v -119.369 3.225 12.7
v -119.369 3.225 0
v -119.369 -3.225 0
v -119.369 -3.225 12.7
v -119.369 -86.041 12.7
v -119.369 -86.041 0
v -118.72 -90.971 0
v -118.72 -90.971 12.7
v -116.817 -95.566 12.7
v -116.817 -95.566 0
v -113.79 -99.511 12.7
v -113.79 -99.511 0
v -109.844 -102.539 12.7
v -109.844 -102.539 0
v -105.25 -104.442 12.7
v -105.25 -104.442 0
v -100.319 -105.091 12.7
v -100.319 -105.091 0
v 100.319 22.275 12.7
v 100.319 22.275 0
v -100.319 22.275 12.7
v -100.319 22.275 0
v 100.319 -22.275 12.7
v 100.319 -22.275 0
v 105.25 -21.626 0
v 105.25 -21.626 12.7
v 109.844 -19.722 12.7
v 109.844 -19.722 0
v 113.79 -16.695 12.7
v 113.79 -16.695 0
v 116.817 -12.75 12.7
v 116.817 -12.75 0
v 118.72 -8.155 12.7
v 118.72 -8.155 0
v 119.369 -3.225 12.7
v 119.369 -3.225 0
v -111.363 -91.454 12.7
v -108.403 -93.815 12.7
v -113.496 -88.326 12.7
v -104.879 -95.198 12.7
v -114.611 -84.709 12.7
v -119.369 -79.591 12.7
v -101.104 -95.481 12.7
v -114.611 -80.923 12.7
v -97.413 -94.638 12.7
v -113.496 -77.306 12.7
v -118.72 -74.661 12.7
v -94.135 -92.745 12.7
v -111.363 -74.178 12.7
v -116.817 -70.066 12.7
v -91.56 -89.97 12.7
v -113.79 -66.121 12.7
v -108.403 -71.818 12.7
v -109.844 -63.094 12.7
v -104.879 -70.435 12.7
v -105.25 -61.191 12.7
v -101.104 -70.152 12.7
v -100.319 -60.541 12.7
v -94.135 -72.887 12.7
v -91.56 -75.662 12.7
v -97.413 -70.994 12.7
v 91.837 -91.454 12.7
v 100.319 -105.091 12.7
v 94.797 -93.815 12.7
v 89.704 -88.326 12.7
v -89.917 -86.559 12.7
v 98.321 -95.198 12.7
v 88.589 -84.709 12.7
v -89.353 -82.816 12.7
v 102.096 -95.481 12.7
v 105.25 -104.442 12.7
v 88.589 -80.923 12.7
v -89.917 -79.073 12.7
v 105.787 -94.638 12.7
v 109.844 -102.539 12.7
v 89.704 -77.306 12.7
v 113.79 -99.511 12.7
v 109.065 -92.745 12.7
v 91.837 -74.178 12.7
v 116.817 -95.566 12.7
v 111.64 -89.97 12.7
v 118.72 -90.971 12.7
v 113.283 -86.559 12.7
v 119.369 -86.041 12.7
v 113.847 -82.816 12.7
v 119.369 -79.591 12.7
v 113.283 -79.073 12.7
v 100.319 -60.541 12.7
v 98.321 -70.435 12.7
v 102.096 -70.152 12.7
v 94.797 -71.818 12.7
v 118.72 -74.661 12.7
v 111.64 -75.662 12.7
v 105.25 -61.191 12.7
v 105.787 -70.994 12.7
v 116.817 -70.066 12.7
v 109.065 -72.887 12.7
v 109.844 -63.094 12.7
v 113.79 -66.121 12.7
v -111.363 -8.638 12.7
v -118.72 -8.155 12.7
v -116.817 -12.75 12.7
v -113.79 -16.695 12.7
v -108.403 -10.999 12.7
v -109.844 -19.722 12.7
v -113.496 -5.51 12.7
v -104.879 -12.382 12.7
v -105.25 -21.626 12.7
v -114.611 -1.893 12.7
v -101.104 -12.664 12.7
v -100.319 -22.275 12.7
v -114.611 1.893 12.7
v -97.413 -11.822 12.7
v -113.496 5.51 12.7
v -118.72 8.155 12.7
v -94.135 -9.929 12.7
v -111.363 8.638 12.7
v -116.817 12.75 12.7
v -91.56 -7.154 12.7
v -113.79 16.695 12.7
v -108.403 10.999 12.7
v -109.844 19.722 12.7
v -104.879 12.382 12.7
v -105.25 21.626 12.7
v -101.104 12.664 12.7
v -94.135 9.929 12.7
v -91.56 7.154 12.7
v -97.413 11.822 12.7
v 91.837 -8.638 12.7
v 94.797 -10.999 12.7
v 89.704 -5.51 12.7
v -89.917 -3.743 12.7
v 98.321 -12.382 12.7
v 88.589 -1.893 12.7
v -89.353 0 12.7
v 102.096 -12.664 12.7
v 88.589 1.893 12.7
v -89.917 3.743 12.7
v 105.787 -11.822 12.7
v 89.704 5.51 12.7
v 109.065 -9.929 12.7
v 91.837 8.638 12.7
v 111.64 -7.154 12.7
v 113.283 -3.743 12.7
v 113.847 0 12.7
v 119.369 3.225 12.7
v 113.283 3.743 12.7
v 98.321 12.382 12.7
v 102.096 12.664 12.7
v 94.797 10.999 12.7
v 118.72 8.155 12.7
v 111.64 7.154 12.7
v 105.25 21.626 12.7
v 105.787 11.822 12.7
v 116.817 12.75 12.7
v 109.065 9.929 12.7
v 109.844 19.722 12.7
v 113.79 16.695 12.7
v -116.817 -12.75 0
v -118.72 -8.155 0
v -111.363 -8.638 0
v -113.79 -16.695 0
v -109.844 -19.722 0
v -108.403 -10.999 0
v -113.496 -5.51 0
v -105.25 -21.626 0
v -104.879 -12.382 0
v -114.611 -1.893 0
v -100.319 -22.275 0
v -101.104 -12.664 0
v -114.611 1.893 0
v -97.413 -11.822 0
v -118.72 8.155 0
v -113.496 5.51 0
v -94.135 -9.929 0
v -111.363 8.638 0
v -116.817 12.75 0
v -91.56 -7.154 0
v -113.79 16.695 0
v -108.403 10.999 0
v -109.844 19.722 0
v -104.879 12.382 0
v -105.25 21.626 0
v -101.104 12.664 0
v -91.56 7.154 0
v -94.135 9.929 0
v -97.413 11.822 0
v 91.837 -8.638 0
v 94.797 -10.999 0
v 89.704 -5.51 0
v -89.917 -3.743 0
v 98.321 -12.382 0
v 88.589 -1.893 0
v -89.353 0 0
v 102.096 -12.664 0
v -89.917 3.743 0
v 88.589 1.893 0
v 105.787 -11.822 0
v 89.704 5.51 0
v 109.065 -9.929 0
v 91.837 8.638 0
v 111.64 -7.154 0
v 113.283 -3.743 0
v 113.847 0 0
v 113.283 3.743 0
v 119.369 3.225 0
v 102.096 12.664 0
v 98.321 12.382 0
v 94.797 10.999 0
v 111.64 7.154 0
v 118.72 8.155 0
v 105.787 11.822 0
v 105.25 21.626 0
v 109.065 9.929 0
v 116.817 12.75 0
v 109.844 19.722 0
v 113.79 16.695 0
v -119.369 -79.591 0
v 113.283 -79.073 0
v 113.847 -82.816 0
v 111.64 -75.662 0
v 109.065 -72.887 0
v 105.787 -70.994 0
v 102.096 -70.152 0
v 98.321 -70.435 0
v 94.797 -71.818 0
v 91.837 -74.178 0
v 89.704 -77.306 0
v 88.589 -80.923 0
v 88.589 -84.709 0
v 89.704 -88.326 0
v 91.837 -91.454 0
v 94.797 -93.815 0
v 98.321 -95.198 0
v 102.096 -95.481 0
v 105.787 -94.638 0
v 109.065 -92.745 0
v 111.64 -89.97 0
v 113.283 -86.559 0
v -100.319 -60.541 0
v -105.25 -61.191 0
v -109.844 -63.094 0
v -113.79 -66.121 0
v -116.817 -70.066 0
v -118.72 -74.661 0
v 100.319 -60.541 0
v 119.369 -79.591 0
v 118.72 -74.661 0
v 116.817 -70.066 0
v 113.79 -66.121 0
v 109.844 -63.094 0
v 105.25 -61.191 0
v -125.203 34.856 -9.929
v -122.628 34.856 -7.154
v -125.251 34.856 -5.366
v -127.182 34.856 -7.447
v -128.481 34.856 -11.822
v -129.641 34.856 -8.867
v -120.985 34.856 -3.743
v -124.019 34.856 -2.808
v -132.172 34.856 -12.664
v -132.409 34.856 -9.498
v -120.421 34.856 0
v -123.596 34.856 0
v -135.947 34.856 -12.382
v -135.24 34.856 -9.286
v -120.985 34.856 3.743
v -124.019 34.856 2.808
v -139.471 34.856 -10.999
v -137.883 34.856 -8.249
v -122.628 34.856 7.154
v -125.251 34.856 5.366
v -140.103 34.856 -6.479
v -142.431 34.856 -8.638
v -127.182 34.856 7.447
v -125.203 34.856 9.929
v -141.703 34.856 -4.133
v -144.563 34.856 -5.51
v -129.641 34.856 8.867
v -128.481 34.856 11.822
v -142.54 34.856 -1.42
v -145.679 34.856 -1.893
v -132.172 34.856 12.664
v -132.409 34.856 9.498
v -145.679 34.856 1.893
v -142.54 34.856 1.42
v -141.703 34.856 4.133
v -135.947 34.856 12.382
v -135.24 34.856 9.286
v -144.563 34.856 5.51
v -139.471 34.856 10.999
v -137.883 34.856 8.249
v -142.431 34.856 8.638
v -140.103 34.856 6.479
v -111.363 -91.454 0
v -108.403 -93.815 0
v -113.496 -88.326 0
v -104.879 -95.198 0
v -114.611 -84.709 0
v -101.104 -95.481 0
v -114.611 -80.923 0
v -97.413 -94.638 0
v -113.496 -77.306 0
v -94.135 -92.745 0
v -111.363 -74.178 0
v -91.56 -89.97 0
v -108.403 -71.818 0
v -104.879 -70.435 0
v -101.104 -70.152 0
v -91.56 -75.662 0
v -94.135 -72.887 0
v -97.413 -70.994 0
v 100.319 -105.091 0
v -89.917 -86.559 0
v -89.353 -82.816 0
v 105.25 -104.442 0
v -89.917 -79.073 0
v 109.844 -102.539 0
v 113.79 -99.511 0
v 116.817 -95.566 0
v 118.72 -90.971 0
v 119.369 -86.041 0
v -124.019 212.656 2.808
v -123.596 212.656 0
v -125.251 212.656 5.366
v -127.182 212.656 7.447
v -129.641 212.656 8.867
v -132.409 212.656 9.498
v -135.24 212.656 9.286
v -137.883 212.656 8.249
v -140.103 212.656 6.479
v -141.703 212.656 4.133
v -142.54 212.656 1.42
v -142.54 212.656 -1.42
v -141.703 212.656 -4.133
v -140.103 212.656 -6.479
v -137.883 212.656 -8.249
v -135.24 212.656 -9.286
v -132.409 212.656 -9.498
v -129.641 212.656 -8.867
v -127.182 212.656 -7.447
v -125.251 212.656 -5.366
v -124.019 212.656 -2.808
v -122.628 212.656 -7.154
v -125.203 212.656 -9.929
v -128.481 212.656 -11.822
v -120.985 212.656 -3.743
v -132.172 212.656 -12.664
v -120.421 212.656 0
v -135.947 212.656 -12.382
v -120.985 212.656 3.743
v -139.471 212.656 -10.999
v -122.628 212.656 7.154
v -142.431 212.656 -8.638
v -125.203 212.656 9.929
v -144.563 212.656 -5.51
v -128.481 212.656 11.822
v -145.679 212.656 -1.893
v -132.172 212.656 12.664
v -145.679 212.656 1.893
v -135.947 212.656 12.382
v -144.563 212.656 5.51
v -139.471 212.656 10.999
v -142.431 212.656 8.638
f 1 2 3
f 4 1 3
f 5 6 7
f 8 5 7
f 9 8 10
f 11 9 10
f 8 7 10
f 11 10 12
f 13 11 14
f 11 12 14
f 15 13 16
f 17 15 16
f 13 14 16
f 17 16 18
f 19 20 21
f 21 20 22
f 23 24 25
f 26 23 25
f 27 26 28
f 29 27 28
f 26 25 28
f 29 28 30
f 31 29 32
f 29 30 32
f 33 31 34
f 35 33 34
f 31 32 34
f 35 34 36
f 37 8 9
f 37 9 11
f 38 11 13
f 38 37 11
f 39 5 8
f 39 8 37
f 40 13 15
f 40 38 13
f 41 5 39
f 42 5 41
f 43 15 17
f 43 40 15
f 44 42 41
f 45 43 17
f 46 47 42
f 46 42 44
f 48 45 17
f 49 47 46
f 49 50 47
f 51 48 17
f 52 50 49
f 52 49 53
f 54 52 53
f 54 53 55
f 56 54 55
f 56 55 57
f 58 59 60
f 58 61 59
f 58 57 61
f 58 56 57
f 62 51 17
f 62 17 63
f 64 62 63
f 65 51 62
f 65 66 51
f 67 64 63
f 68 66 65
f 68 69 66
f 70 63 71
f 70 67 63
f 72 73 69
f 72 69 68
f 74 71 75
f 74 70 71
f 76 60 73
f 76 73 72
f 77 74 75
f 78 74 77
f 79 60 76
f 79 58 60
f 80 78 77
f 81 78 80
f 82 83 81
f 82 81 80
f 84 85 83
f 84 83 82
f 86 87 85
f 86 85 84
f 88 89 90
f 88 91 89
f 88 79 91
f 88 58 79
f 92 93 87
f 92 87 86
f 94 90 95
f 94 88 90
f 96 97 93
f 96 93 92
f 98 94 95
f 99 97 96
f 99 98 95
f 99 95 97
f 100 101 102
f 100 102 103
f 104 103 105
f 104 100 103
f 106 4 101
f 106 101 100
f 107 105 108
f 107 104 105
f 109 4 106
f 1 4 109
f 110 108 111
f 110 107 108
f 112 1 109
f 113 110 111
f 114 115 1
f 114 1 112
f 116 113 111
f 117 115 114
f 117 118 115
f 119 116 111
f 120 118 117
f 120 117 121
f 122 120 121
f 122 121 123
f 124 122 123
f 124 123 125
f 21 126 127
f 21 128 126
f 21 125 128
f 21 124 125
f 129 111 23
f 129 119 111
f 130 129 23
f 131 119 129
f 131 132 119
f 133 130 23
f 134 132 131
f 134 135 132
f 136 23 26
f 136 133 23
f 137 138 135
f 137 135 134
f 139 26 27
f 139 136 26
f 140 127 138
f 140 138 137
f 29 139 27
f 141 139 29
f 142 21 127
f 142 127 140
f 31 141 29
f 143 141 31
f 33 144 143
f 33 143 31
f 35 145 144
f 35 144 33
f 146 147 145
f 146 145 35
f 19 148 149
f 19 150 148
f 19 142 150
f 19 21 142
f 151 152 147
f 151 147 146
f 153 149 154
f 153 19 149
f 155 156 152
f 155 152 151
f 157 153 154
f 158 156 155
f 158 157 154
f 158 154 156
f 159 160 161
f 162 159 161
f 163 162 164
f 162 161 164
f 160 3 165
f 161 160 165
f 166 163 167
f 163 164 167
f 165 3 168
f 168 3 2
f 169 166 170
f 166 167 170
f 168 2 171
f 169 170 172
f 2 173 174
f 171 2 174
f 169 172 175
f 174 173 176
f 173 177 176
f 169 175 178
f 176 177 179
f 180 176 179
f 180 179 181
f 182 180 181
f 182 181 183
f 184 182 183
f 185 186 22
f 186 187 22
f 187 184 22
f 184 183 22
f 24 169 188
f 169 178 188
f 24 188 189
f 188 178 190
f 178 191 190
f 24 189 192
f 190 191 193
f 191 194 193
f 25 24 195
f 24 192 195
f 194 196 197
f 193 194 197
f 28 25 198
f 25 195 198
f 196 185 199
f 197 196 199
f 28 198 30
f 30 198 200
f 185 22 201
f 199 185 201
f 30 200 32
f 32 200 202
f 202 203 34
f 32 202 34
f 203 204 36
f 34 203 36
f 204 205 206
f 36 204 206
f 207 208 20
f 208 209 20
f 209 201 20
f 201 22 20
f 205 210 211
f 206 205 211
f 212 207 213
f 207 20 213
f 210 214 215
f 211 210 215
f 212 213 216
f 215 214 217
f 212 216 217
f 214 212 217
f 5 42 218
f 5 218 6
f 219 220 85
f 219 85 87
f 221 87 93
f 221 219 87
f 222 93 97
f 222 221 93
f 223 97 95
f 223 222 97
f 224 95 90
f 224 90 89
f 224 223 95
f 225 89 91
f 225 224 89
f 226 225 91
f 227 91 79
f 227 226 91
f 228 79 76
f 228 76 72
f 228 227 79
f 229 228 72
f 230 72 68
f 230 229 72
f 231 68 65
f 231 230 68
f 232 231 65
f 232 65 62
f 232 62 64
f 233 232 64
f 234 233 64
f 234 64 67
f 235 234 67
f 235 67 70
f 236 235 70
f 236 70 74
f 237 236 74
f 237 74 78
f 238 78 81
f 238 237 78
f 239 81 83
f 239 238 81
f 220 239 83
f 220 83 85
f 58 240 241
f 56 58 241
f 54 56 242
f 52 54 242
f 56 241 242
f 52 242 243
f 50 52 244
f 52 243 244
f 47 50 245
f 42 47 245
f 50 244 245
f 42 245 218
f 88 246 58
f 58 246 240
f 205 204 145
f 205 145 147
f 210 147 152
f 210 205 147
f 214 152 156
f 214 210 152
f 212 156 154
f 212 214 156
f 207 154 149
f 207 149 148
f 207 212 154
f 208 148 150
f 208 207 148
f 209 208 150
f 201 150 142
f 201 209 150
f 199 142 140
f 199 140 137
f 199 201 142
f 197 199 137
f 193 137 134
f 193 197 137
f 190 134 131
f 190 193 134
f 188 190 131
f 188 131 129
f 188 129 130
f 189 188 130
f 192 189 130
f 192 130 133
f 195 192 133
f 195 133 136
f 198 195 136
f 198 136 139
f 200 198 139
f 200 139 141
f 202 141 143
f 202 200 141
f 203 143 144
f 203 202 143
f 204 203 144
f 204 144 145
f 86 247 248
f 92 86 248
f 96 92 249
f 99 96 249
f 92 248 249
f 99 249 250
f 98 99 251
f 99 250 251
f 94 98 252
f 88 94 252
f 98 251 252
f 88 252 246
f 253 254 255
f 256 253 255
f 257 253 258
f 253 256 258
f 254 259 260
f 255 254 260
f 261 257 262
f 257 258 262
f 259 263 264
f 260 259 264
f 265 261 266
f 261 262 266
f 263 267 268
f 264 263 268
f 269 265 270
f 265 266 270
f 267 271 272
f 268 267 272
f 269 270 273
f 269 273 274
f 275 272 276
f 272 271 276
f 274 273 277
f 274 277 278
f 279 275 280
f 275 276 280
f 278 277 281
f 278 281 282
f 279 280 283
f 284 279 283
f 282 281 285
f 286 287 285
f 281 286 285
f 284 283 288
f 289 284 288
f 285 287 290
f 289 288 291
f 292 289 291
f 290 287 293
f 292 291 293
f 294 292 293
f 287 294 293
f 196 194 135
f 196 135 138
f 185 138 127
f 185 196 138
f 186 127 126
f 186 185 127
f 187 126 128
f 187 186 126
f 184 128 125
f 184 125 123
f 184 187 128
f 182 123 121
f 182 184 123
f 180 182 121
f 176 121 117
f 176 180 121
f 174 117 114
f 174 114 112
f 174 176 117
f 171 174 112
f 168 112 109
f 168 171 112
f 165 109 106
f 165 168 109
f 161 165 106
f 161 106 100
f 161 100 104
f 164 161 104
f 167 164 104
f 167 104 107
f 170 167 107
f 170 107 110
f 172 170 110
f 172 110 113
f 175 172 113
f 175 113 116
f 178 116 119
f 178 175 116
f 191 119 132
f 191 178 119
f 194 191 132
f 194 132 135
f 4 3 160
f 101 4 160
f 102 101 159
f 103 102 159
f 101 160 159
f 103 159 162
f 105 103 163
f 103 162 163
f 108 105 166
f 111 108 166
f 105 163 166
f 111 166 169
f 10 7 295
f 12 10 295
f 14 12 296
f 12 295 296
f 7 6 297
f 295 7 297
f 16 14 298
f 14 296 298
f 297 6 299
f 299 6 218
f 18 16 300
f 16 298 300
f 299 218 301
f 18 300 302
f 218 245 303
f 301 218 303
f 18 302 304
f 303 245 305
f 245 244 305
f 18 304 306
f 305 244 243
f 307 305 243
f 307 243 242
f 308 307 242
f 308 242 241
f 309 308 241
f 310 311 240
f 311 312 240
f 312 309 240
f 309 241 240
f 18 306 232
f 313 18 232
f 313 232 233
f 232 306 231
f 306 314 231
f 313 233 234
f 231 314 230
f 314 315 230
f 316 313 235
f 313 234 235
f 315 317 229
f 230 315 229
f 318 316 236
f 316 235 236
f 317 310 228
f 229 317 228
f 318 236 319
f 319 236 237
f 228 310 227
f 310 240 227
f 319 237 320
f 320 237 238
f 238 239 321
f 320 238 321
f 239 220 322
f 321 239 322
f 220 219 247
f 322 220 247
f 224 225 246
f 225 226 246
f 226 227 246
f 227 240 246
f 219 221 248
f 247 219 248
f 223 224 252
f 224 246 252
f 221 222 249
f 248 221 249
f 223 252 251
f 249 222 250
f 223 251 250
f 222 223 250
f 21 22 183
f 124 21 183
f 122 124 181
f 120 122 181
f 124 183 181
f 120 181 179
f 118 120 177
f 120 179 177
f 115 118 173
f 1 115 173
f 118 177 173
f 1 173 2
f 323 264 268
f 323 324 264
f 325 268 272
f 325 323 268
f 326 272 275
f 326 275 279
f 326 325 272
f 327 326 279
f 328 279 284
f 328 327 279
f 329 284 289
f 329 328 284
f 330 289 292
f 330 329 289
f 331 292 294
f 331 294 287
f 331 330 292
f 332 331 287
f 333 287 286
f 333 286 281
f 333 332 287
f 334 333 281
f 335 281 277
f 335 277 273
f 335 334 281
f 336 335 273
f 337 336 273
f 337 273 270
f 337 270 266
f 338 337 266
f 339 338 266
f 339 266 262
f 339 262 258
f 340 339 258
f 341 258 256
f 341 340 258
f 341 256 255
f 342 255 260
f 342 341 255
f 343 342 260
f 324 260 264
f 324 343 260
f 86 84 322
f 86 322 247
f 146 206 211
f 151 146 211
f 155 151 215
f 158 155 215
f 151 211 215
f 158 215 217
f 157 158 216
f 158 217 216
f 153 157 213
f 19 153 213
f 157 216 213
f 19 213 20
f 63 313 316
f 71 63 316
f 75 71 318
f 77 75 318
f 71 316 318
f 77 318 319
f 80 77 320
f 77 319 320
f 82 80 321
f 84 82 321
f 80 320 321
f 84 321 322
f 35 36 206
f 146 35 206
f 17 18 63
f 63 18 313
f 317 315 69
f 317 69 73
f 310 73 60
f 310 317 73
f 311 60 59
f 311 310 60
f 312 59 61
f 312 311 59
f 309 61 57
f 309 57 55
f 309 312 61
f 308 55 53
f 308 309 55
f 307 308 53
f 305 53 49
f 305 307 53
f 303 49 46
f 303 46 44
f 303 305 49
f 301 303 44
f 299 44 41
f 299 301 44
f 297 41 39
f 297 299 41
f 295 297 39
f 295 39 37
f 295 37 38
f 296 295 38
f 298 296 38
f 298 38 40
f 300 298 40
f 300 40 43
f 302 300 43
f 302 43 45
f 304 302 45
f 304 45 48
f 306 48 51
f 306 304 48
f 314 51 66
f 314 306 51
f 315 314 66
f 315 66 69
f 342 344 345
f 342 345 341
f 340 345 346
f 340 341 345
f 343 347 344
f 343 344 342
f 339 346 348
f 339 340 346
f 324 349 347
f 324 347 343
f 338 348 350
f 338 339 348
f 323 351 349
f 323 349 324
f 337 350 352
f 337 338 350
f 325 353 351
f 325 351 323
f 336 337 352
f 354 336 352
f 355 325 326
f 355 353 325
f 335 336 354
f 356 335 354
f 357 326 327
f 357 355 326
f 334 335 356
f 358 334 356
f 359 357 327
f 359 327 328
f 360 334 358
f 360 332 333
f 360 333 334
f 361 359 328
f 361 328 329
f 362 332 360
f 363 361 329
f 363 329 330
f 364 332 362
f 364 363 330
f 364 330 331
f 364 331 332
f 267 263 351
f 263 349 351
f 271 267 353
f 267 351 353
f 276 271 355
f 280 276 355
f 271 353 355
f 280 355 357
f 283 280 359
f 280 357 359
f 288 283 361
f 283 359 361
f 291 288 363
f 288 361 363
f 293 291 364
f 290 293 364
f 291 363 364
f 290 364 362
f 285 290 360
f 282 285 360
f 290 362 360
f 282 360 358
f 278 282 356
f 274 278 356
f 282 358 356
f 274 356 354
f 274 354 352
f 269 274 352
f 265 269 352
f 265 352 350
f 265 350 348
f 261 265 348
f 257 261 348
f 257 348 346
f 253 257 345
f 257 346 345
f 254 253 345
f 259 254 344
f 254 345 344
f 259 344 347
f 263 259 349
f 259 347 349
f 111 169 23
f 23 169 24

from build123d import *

# Parameters (mm, degrees)
F0_R     = 12.7
F1_DEPTH = 12.7
F2_W     = 3.175
F2_H     = 177.8


with BuildPart() as f1:
    # F0 (on Top) → F1 (new body)
    with BuildSketch(Plane.XY):
        with BuildLine():
            ThreePointArc((-119.369373, -3.224673), (-113.789757, -16.695057), (-100.319373, -22.274673))
            Line((-100.319373, -22.274673), (100.319373, -22.274673))
            ThreePointArc((100.319373, -22.274673), (113.789757, -16.695057), (119.369373, -3.224673))
            Line((119.369373, -3.224673), (119.369373, 3.224673))
            ThreePointArc((119.369373, 3.224673), (113.789757, 16.695057), (100.319373, 22.274673))
            Line((100.319373, 22.274673), (-100.319373, 22.274673))
            ThreePointArc((-100.319373, 22.274673), (-113.789757, 16.695057), (-119.369373, 3.224673))
            Line((-119.369373, 3.224673), (-119.369373, -3.224673))
        make_face()
        with Locations((-102.053202, 0)):
            Circle(F0_R, mode=Mode.SUBTRACT)
        with Locations((101.146798, 0)):
            Circle(F0_R, mode=Mode.SUBTRACT)
        with BuildLine():
            Line((119.369373, -86.04076), (119.369373, -79.591414))
            ThreePointArc((119.369373, -79.591414), (113.789757, -66.12103), (100.319373, -60.541414))
            Line((100.319373, -60.541414), (-100.319373, -60.541414))
            ThreePointArc((-100.319373, -60.541414), (-113.789757, -66.12103), (-119.369373, -79.591414))
            Line((-119.369373, -79.591414), (-119.369373, -86.04076))
            ThreePointArc((-119.369373, -86.04076), (-113.789757, -99.511144), (-100.319373, -105.09076))
            Line((-100.319373, -105.09076), (100.319373, -105.09076))
            ThreePointArc((100.319373, -105.09076), (113.789757, -99.511144), (119.369373, -86.04076))
        make_face()
        with Locations((-102.053202, -82.816087)):
            Circle(F0_R, mode=Mode.SUBTRACT)
        with Locations((101.146798, -82.816087)):
            Circle(F0_R, mode=Mode.SUBTRACT)
    extrude(amount=F1_DEPTH)


with BuildPart() as f3:
    # F2 (on Top) → F3 (revolve)
    with BuildSketch(Plane.XY):
        with Locations((-122.008439, 123.756327)):
            Rectangle(F2_W, F2_H)
    revolve(axis=Axis((-133.120939, 123.756327, 0), (0, -1, 0)))


solid = Compound([f1.part, f3.part])
